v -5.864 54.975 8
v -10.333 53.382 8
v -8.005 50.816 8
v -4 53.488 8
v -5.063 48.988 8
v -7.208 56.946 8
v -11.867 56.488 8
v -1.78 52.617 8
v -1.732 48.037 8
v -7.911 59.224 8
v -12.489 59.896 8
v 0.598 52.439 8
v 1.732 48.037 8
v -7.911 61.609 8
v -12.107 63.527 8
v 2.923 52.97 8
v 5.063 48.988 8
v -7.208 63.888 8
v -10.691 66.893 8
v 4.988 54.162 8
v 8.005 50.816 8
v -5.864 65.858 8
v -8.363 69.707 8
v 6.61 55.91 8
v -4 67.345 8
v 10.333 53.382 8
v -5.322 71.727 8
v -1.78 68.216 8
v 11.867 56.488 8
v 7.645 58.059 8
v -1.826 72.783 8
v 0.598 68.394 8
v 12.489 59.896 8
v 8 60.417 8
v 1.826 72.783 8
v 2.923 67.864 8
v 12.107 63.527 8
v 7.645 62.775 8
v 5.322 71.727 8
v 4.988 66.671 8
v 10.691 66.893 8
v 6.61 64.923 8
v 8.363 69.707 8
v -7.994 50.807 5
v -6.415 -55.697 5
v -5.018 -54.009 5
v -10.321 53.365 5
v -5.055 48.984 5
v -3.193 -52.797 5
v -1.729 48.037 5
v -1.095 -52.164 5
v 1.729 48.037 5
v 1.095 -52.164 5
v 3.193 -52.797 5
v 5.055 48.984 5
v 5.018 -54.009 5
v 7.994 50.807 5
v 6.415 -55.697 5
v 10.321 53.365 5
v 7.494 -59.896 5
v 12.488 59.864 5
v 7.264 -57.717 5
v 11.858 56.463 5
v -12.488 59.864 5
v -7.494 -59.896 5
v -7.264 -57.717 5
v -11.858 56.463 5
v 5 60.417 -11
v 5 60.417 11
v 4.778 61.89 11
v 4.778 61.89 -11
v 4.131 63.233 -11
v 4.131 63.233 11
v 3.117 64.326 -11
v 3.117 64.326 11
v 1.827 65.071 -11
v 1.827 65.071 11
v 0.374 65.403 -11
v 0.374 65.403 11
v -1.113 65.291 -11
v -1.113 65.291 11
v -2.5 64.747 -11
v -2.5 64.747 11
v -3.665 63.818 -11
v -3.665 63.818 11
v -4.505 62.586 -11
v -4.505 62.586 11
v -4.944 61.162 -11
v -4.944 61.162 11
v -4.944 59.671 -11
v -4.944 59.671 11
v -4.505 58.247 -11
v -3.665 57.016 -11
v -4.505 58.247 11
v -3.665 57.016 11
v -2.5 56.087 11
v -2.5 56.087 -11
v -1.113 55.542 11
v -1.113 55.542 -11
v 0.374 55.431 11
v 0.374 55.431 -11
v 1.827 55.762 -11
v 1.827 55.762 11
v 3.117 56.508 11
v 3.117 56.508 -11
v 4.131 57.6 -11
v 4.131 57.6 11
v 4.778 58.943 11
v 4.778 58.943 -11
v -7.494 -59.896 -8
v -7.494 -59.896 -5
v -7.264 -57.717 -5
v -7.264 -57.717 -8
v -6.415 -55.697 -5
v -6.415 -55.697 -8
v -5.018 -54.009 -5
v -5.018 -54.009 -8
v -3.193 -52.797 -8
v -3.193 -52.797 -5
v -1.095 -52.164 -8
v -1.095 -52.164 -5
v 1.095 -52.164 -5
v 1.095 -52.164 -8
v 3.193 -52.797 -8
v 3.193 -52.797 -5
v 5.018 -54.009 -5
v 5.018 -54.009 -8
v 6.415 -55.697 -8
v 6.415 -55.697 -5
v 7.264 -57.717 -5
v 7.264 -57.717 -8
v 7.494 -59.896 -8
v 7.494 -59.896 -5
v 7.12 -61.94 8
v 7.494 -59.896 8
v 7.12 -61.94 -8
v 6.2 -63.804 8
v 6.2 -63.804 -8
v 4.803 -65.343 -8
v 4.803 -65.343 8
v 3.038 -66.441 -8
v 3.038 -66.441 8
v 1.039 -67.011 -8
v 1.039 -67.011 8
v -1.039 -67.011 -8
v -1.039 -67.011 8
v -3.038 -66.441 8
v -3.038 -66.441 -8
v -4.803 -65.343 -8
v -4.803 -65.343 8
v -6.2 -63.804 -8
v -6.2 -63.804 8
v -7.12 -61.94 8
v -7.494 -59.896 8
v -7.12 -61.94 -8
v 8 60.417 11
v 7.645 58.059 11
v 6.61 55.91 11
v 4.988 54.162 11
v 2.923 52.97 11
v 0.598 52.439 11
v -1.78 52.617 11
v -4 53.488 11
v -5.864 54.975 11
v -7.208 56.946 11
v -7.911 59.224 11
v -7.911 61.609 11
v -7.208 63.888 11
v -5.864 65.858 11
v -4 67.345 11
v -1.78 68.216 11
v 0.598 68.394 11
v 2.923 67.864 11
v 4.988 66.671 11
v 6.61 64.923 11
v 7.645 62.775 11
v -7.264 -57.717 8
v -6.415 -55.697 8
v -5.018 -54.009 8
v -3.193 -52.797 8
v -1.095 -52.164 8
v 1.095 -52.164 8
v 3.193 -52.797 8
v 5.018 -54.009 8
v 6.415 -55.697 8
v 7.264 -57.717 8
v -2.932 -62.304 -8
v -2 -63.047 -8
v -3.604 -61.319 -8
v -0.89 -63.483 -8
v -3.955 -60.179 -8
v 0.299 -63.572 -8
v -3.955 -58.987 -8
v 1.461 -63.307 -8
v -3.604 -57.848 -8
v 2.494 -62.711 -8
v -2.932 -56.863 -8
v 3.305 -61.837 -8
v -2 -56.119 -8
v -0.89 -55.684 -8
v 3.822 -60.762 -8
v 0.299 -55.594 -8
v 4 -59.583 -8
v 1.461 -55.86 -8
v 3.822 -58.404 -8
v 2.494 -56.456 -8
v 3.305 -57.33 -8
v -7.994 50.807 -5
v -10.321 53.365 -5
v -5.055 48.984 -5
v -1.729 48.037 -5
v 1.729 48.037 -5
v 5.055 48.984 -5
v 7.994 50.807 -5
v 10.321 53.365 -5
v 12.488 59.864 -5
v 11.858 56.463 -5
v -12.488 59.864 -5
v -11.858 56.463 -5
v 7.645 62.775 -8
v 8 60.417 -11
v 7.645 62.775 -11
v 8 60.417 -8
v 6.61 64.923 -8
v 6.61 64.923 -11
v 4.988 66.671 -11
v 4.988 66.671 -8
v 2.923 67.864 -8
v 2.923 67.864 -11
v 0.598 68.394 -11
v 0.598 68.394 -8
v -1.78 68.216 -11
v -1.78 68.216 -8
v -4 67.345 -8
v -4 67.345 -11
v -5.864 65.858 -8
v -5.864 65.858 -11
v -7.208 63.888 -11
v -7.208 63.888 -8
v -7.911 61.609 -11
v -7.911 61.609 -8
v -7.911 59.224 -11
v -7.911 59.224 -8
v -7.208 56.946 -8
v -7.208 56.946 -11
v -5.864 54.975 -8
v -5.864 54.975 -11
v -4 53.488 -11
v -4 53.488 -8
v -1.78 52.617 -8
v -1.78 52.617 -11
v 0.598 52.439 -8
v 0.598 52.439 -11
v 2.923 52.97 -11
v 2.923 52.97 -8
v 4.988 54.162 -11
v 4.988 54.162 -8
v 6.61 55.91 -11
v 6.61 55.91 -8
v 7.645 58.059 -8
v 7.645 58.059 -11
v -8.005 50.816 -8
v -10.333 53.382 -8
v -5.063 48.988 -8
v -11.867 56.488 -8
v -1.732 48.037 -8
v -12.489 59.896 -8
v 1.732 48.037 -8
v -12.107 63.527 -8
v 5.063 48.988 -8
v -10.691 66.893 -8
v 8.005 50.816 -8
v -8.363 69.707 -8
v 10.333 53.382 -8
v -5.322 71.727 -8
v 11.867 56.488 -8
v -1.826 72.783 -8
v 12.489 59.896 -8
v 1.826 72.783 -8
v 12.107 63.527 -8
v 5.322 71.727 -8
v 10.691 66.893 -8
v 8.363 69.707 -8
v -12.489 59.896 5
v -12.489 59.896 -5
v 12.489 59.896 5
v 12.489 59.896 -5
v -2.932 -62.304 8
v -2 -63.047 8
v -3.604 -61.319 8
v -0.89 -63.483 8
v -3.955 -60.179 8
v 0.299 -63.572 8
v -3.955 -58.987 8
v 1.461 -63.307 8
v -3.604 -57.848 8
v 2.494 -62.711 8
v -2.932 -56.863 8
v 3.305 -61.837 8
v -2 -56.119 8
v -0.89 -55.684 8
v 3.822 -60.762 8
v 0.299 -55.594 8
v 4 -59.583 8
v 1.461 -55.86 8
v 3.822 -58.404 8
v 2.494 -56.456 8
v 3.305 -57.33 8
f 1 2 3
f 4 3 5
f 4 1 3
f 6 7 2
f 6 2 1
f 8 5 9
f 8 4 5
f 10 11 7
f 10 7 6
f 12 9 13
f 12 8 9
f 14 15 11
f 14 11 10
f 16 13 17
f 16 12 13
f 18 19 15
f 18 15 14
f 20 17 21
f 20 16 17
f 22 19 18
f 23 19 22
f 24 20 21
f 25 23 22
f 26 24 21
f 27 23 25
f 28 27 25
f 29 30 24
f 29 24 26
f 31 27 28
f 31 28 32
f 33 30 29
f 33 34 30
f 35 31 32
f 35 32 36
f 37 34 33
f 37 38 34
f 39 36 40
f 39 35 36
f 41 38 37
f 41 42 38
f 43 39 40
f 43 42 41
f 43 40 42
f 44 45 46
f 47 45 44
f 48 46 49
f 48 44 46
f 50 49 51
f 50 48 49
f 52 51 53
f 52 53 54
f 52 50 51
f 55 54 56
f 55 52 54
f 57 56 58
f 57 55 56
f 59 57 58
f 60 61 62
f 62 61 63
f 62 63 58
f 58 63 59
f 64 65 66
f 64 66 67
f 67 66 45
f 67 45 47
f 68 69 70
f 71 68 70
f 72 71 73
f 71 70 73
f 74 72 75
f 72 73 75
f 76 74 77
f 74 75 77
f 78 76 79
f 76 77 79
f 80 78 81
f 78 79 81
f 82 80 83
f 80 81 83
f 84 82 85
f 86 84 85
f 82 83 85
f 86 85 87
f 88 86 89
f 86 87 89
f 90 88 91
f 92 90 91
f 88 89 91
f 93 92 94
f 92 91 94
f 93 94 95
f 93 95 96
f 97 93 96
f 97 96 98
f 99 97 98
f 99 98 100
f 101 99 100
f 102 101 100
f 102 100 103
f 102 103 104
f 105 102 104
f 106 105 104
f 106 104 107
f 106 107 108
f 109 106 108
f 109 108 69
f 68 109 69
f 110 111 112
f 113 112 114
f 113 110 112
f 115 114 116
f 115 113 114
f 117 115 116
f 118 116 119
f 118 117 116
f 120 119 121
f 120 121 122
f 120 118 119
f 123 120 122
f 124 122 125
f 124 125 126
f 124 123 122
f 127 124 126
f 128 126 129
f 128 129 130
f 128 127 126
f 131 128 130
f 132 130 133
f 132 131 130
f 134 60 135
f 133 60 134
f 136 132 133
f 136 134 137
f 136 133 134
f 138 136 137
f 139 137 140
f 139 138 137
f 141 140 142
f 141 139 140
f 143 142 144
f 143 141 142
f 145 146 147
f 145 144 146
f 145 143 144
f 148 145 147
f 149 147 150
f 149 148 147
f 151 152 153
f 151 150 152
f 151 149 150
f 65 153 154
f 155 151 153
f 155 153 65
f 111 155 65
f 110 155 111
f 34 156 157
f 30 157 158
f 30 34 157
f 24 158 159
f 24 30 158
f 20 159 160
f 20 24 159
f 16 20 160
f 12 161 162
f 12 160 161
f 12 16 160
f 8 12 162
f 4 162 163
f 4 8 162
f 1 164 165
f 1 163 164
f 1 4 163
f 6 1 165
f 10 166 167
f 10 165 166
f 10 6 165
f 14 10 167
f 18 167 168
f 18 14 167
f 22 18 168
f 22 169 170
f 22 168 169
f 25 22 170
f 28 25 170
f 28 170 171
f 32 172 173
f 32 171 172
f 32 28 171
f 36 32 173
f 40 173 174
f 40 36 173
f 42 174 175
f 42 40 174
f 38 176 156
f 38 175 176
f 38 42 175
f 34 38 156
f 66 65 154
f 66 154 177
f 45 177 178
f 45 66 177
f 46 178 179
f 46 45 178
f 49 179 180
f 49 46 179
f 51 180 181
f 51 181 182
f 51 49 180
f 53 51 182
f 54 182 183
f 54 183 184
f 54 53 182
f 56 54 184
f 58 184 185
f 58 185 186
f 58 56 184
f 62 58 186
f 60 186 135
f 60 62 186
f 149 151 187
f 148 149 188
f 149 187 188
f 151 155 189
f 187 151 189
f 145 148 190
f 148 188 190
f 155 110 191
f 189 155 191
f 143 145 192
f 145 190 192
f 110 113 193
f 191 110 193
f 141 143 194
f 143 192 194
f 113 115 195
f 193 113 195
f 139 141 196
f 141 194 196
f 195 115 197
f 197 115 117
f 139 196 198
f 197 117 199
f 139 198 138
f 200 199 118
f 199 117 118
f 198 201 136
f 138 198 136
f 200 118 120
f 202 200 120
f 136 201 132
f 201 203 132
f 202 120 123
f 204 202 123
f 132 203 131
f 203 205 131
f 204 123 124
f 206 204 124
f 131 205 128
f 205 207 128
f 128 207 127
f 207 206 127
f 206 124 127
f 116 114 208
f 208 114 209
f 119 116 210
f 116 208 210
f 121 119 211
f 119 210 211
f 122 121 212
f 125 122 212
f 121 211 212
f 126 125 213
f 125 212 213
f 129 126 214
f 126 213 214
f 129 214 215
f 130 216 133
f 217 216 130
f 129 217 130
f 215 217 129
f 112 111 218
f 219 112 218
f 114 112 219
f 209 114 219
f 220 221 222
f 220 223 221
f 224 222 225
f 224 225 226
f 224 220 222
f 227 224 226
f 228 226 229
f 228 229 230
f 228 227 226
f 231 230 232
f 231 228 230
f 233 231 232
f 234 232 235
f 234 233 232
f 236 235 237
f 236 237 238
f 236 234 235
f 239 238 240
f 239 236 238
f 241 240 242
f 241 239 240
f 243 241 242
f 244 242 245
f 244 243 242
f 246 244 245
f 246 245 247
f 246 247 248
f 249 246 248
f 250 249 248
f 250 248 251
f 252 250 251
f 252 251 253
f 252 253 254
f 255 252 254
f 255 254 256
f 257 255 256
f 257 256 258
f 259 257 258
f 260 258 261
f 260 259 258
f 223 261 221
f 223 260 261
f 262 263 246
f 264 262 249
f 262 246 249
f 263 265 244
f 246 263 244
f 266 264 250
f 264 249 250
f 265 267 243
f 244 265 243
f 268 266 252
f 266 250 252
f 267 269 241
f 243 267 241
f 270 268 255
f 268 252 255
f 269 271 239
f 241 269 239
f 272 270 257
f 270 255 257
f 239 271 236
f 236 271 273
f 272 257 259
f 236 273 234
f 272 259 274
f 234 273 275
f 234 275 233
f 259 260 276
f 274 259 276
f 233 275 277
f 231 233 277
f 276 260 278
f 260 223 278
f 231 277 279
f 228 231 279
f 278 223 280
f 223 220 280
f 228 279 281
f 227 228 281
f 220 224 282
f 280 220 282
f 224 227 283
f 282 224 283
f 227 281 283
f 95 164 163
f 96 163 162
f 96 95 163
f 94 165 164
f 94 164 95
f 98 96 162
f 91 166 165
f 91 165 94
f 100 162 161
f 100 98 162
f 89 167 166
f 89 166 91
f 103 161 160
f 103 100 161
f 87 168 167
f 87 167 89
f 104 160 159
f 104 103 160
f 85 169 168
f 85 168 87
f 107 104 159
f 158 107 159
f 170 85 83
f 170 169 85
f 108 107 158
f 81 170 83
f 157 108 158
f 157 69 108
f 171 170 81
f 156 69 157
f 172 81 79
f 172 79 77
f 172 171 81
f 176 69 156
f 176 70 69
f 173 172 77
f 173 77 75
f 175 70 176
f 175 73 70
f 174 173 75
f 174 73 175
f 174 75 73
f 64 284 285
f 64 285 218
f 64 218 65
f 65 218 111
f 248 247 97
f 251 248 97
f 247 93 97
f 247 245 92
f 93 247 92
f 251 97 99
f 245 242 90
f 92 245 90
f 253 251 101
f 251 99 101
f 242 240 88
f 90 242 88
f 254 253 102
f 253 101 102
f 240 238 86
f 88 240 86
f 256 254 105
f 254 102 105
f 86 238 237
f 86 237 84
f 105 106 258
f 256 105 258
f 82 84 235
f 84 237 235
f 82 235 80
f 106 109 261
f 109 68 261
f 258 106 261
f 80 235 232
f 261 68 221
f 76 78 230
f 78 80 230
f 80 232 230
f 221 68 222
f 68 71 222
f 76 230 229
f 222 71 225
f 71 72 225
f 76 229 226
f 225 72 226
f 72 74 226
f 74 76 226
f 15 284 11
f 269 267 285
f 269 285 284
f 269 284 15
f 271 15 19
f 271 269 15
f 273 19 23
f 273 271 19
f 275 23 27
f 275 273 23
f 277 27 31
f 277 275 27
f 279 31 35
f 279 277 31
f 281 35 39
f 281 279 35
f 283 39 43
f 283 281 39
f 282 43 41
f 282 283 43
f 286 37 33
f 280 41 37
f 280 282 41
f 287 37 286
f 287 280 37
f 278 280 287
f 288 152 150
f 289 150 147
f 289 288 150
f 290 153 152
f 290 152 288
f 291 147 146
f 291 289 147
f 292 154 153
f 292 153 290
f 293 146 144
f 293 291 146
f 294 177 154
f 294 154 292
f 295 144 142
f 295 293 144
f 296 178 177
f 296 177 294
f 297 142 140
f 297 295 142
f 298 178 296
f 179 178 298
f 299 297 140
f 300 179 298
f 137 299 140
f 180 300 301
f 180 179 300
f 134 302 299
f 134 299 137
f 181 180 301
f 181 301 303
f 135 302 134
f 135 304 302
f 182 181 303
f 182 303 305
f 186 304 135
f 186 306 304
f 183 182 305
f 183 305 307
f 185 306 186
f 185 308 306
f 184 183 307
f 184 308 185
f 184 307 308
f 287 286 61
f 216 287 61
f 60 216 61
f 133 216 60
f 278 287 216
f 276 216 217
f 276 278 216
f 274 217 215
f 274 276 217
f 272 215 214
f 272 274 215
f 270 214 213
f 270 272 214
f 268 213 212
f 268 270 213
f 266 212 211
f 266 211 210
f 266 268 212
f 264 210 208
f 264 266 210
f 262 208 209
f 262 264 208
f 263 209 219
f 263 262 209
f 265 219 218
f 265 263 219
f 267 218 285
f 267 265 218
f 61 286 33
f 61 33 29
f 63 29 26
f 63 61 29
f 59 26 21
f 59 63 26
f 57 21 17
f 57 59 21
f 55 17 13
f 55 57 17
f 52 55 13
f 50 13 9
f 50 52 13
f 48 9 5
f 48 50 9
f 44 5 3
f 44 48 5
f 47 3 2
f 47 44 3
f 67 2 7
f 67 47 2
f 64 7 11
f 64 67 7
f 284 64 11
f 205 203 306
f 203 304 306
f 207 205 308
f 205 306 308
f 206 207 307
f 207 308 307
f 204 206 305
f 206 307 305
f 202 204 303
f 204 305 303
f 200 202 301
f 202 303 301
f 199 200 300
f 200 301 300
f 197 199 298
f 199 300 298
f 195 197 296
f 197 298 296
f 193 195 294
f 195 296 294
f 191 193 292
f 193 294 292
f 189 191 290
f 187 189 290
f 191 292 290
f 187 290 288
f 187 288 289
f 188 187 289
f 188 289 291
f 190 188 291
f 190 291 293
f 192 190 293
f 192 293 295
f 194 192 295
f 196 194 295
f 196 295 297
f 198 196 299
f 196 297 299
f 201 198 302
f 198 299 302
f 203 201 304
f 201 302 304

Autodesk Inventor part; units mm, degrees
ref_plane "YZ Plane" through (0, 0, 0) normal (1, 0, 0) x (0, 1, 0)
ref_plane "XZ Plane" through (0, 0, 0) normal (0, 1, 0) x (-1, 0, 0)
ref_plane "XY Plane" through (0, 0, 0) normal (0, 0, 1) x (1, 0, 0)
sketch "Sketch1" plane through (0, 0, 0) normal (0, 0, 1) x (1, 0, 0)
  line L0 (-17.5, 0) -> (17.5, 0) projected
  line L1 (0, -95.0833) -> (0, 100.9167) projected
  arc A0 (12.4891, 59.8958) -> (-12.4891, 59.8958) centre (0, 60.4167) ccw
  arc A1 (-7.4935, -59.8958) -> (7.4935, -59.8958) centre (0, -59.5833) ccw
  line L2 (-12.4891, 59.8958) -> (-7.4935, -59.8958)
  line L3 (12.4891, 59.8958) -> (7.4935, -59.8958)
  point P0 (0, 0)
  point P1 (-9.9913, 0)
  dimension "d0" = 25
  dimension "d1" = 15
  dimension "d2" = 120
extrude "Extrusion1" add sketch "Sketch1" along normal mid plane 10
sketch "Sketch2" plane through (0, 0, 0) normal (0, 0, 1) x (1, 0, 0)
  line L0 (-7.4935, -59.8958) -> (-12.4891, 59.8958) projected
  arc A0 (12.4891, 59.8958) -> (-12.4891, 59.8958) centre (0, 60.4167) ccw projected
  line L1 (12.4891, 59.8958) -> (7.4935, -59.8958) projected
  arc A1 (-7.4935, -59.8958) -> (7.4935, -59.8958) centre (0, -59.5833) ccw projected
  circle A2 centre (0, 60.4167) radius 12.5
  circle A3 centre (0, -59.5833) radius 7.5
  point P0 (0, 0)
extrude "Extrusion2" add sketch "Sketch2" along normal mid plane 16 contours A3 A1 | A0 A2
sketch "Sketch3" plane through (0, 0, 0) normal (0, 0, 1) x (1, 0, 0)
  circle A0 centre (0, 60.4167) radius 8
  circle A1 centre (0, 60.4167) radius 12.5 projected
  point P0 (0, 0)
  dimension "d7" = 16
extrude "Extrusion3" add sketch "Sketch3" along normal mid plane 22 contours A0
sketch "Sketch4" plane through (0, 0, 0) normal (0, 0, 1) x (1, 0, 0)
  arc A0 (7.4935, -59.8958) -> (-7.4935, -59.8958) centre (0, -59.5833) ccw projected
  line L0 (-7.4935, -59.8958) -> (-12.4891, 59.8958) projected
  arc A1 (-12.4891, 59.8958) -> (12.4891, 59.8958) centre (0, 60.4167) ccw projected
  line L1 (12.4891, 59.8958) -> (7.4935, -59.8958) projected
  circle A2 centre (0, 60.4167) radius 8 projected
  circle A3 centre (0, 60.4167) radius 12.5 projected
  circle A4 centre (0, -59.5833) radius 7.5 projected
  circle A5 centre (0, 60.4167) radius 5
  circle A6 centre (0, -59.5833) radius 4
  point P0 (0, 0)
  dimension "d10" = 10
  dimension "d11" = 8
extrude "Extrusion4" cut sketch "Sketch4" along normal through all both and the other way through all contours A5 | A6
properties part number "Connector_Rod" material "Steel, Carbon"
